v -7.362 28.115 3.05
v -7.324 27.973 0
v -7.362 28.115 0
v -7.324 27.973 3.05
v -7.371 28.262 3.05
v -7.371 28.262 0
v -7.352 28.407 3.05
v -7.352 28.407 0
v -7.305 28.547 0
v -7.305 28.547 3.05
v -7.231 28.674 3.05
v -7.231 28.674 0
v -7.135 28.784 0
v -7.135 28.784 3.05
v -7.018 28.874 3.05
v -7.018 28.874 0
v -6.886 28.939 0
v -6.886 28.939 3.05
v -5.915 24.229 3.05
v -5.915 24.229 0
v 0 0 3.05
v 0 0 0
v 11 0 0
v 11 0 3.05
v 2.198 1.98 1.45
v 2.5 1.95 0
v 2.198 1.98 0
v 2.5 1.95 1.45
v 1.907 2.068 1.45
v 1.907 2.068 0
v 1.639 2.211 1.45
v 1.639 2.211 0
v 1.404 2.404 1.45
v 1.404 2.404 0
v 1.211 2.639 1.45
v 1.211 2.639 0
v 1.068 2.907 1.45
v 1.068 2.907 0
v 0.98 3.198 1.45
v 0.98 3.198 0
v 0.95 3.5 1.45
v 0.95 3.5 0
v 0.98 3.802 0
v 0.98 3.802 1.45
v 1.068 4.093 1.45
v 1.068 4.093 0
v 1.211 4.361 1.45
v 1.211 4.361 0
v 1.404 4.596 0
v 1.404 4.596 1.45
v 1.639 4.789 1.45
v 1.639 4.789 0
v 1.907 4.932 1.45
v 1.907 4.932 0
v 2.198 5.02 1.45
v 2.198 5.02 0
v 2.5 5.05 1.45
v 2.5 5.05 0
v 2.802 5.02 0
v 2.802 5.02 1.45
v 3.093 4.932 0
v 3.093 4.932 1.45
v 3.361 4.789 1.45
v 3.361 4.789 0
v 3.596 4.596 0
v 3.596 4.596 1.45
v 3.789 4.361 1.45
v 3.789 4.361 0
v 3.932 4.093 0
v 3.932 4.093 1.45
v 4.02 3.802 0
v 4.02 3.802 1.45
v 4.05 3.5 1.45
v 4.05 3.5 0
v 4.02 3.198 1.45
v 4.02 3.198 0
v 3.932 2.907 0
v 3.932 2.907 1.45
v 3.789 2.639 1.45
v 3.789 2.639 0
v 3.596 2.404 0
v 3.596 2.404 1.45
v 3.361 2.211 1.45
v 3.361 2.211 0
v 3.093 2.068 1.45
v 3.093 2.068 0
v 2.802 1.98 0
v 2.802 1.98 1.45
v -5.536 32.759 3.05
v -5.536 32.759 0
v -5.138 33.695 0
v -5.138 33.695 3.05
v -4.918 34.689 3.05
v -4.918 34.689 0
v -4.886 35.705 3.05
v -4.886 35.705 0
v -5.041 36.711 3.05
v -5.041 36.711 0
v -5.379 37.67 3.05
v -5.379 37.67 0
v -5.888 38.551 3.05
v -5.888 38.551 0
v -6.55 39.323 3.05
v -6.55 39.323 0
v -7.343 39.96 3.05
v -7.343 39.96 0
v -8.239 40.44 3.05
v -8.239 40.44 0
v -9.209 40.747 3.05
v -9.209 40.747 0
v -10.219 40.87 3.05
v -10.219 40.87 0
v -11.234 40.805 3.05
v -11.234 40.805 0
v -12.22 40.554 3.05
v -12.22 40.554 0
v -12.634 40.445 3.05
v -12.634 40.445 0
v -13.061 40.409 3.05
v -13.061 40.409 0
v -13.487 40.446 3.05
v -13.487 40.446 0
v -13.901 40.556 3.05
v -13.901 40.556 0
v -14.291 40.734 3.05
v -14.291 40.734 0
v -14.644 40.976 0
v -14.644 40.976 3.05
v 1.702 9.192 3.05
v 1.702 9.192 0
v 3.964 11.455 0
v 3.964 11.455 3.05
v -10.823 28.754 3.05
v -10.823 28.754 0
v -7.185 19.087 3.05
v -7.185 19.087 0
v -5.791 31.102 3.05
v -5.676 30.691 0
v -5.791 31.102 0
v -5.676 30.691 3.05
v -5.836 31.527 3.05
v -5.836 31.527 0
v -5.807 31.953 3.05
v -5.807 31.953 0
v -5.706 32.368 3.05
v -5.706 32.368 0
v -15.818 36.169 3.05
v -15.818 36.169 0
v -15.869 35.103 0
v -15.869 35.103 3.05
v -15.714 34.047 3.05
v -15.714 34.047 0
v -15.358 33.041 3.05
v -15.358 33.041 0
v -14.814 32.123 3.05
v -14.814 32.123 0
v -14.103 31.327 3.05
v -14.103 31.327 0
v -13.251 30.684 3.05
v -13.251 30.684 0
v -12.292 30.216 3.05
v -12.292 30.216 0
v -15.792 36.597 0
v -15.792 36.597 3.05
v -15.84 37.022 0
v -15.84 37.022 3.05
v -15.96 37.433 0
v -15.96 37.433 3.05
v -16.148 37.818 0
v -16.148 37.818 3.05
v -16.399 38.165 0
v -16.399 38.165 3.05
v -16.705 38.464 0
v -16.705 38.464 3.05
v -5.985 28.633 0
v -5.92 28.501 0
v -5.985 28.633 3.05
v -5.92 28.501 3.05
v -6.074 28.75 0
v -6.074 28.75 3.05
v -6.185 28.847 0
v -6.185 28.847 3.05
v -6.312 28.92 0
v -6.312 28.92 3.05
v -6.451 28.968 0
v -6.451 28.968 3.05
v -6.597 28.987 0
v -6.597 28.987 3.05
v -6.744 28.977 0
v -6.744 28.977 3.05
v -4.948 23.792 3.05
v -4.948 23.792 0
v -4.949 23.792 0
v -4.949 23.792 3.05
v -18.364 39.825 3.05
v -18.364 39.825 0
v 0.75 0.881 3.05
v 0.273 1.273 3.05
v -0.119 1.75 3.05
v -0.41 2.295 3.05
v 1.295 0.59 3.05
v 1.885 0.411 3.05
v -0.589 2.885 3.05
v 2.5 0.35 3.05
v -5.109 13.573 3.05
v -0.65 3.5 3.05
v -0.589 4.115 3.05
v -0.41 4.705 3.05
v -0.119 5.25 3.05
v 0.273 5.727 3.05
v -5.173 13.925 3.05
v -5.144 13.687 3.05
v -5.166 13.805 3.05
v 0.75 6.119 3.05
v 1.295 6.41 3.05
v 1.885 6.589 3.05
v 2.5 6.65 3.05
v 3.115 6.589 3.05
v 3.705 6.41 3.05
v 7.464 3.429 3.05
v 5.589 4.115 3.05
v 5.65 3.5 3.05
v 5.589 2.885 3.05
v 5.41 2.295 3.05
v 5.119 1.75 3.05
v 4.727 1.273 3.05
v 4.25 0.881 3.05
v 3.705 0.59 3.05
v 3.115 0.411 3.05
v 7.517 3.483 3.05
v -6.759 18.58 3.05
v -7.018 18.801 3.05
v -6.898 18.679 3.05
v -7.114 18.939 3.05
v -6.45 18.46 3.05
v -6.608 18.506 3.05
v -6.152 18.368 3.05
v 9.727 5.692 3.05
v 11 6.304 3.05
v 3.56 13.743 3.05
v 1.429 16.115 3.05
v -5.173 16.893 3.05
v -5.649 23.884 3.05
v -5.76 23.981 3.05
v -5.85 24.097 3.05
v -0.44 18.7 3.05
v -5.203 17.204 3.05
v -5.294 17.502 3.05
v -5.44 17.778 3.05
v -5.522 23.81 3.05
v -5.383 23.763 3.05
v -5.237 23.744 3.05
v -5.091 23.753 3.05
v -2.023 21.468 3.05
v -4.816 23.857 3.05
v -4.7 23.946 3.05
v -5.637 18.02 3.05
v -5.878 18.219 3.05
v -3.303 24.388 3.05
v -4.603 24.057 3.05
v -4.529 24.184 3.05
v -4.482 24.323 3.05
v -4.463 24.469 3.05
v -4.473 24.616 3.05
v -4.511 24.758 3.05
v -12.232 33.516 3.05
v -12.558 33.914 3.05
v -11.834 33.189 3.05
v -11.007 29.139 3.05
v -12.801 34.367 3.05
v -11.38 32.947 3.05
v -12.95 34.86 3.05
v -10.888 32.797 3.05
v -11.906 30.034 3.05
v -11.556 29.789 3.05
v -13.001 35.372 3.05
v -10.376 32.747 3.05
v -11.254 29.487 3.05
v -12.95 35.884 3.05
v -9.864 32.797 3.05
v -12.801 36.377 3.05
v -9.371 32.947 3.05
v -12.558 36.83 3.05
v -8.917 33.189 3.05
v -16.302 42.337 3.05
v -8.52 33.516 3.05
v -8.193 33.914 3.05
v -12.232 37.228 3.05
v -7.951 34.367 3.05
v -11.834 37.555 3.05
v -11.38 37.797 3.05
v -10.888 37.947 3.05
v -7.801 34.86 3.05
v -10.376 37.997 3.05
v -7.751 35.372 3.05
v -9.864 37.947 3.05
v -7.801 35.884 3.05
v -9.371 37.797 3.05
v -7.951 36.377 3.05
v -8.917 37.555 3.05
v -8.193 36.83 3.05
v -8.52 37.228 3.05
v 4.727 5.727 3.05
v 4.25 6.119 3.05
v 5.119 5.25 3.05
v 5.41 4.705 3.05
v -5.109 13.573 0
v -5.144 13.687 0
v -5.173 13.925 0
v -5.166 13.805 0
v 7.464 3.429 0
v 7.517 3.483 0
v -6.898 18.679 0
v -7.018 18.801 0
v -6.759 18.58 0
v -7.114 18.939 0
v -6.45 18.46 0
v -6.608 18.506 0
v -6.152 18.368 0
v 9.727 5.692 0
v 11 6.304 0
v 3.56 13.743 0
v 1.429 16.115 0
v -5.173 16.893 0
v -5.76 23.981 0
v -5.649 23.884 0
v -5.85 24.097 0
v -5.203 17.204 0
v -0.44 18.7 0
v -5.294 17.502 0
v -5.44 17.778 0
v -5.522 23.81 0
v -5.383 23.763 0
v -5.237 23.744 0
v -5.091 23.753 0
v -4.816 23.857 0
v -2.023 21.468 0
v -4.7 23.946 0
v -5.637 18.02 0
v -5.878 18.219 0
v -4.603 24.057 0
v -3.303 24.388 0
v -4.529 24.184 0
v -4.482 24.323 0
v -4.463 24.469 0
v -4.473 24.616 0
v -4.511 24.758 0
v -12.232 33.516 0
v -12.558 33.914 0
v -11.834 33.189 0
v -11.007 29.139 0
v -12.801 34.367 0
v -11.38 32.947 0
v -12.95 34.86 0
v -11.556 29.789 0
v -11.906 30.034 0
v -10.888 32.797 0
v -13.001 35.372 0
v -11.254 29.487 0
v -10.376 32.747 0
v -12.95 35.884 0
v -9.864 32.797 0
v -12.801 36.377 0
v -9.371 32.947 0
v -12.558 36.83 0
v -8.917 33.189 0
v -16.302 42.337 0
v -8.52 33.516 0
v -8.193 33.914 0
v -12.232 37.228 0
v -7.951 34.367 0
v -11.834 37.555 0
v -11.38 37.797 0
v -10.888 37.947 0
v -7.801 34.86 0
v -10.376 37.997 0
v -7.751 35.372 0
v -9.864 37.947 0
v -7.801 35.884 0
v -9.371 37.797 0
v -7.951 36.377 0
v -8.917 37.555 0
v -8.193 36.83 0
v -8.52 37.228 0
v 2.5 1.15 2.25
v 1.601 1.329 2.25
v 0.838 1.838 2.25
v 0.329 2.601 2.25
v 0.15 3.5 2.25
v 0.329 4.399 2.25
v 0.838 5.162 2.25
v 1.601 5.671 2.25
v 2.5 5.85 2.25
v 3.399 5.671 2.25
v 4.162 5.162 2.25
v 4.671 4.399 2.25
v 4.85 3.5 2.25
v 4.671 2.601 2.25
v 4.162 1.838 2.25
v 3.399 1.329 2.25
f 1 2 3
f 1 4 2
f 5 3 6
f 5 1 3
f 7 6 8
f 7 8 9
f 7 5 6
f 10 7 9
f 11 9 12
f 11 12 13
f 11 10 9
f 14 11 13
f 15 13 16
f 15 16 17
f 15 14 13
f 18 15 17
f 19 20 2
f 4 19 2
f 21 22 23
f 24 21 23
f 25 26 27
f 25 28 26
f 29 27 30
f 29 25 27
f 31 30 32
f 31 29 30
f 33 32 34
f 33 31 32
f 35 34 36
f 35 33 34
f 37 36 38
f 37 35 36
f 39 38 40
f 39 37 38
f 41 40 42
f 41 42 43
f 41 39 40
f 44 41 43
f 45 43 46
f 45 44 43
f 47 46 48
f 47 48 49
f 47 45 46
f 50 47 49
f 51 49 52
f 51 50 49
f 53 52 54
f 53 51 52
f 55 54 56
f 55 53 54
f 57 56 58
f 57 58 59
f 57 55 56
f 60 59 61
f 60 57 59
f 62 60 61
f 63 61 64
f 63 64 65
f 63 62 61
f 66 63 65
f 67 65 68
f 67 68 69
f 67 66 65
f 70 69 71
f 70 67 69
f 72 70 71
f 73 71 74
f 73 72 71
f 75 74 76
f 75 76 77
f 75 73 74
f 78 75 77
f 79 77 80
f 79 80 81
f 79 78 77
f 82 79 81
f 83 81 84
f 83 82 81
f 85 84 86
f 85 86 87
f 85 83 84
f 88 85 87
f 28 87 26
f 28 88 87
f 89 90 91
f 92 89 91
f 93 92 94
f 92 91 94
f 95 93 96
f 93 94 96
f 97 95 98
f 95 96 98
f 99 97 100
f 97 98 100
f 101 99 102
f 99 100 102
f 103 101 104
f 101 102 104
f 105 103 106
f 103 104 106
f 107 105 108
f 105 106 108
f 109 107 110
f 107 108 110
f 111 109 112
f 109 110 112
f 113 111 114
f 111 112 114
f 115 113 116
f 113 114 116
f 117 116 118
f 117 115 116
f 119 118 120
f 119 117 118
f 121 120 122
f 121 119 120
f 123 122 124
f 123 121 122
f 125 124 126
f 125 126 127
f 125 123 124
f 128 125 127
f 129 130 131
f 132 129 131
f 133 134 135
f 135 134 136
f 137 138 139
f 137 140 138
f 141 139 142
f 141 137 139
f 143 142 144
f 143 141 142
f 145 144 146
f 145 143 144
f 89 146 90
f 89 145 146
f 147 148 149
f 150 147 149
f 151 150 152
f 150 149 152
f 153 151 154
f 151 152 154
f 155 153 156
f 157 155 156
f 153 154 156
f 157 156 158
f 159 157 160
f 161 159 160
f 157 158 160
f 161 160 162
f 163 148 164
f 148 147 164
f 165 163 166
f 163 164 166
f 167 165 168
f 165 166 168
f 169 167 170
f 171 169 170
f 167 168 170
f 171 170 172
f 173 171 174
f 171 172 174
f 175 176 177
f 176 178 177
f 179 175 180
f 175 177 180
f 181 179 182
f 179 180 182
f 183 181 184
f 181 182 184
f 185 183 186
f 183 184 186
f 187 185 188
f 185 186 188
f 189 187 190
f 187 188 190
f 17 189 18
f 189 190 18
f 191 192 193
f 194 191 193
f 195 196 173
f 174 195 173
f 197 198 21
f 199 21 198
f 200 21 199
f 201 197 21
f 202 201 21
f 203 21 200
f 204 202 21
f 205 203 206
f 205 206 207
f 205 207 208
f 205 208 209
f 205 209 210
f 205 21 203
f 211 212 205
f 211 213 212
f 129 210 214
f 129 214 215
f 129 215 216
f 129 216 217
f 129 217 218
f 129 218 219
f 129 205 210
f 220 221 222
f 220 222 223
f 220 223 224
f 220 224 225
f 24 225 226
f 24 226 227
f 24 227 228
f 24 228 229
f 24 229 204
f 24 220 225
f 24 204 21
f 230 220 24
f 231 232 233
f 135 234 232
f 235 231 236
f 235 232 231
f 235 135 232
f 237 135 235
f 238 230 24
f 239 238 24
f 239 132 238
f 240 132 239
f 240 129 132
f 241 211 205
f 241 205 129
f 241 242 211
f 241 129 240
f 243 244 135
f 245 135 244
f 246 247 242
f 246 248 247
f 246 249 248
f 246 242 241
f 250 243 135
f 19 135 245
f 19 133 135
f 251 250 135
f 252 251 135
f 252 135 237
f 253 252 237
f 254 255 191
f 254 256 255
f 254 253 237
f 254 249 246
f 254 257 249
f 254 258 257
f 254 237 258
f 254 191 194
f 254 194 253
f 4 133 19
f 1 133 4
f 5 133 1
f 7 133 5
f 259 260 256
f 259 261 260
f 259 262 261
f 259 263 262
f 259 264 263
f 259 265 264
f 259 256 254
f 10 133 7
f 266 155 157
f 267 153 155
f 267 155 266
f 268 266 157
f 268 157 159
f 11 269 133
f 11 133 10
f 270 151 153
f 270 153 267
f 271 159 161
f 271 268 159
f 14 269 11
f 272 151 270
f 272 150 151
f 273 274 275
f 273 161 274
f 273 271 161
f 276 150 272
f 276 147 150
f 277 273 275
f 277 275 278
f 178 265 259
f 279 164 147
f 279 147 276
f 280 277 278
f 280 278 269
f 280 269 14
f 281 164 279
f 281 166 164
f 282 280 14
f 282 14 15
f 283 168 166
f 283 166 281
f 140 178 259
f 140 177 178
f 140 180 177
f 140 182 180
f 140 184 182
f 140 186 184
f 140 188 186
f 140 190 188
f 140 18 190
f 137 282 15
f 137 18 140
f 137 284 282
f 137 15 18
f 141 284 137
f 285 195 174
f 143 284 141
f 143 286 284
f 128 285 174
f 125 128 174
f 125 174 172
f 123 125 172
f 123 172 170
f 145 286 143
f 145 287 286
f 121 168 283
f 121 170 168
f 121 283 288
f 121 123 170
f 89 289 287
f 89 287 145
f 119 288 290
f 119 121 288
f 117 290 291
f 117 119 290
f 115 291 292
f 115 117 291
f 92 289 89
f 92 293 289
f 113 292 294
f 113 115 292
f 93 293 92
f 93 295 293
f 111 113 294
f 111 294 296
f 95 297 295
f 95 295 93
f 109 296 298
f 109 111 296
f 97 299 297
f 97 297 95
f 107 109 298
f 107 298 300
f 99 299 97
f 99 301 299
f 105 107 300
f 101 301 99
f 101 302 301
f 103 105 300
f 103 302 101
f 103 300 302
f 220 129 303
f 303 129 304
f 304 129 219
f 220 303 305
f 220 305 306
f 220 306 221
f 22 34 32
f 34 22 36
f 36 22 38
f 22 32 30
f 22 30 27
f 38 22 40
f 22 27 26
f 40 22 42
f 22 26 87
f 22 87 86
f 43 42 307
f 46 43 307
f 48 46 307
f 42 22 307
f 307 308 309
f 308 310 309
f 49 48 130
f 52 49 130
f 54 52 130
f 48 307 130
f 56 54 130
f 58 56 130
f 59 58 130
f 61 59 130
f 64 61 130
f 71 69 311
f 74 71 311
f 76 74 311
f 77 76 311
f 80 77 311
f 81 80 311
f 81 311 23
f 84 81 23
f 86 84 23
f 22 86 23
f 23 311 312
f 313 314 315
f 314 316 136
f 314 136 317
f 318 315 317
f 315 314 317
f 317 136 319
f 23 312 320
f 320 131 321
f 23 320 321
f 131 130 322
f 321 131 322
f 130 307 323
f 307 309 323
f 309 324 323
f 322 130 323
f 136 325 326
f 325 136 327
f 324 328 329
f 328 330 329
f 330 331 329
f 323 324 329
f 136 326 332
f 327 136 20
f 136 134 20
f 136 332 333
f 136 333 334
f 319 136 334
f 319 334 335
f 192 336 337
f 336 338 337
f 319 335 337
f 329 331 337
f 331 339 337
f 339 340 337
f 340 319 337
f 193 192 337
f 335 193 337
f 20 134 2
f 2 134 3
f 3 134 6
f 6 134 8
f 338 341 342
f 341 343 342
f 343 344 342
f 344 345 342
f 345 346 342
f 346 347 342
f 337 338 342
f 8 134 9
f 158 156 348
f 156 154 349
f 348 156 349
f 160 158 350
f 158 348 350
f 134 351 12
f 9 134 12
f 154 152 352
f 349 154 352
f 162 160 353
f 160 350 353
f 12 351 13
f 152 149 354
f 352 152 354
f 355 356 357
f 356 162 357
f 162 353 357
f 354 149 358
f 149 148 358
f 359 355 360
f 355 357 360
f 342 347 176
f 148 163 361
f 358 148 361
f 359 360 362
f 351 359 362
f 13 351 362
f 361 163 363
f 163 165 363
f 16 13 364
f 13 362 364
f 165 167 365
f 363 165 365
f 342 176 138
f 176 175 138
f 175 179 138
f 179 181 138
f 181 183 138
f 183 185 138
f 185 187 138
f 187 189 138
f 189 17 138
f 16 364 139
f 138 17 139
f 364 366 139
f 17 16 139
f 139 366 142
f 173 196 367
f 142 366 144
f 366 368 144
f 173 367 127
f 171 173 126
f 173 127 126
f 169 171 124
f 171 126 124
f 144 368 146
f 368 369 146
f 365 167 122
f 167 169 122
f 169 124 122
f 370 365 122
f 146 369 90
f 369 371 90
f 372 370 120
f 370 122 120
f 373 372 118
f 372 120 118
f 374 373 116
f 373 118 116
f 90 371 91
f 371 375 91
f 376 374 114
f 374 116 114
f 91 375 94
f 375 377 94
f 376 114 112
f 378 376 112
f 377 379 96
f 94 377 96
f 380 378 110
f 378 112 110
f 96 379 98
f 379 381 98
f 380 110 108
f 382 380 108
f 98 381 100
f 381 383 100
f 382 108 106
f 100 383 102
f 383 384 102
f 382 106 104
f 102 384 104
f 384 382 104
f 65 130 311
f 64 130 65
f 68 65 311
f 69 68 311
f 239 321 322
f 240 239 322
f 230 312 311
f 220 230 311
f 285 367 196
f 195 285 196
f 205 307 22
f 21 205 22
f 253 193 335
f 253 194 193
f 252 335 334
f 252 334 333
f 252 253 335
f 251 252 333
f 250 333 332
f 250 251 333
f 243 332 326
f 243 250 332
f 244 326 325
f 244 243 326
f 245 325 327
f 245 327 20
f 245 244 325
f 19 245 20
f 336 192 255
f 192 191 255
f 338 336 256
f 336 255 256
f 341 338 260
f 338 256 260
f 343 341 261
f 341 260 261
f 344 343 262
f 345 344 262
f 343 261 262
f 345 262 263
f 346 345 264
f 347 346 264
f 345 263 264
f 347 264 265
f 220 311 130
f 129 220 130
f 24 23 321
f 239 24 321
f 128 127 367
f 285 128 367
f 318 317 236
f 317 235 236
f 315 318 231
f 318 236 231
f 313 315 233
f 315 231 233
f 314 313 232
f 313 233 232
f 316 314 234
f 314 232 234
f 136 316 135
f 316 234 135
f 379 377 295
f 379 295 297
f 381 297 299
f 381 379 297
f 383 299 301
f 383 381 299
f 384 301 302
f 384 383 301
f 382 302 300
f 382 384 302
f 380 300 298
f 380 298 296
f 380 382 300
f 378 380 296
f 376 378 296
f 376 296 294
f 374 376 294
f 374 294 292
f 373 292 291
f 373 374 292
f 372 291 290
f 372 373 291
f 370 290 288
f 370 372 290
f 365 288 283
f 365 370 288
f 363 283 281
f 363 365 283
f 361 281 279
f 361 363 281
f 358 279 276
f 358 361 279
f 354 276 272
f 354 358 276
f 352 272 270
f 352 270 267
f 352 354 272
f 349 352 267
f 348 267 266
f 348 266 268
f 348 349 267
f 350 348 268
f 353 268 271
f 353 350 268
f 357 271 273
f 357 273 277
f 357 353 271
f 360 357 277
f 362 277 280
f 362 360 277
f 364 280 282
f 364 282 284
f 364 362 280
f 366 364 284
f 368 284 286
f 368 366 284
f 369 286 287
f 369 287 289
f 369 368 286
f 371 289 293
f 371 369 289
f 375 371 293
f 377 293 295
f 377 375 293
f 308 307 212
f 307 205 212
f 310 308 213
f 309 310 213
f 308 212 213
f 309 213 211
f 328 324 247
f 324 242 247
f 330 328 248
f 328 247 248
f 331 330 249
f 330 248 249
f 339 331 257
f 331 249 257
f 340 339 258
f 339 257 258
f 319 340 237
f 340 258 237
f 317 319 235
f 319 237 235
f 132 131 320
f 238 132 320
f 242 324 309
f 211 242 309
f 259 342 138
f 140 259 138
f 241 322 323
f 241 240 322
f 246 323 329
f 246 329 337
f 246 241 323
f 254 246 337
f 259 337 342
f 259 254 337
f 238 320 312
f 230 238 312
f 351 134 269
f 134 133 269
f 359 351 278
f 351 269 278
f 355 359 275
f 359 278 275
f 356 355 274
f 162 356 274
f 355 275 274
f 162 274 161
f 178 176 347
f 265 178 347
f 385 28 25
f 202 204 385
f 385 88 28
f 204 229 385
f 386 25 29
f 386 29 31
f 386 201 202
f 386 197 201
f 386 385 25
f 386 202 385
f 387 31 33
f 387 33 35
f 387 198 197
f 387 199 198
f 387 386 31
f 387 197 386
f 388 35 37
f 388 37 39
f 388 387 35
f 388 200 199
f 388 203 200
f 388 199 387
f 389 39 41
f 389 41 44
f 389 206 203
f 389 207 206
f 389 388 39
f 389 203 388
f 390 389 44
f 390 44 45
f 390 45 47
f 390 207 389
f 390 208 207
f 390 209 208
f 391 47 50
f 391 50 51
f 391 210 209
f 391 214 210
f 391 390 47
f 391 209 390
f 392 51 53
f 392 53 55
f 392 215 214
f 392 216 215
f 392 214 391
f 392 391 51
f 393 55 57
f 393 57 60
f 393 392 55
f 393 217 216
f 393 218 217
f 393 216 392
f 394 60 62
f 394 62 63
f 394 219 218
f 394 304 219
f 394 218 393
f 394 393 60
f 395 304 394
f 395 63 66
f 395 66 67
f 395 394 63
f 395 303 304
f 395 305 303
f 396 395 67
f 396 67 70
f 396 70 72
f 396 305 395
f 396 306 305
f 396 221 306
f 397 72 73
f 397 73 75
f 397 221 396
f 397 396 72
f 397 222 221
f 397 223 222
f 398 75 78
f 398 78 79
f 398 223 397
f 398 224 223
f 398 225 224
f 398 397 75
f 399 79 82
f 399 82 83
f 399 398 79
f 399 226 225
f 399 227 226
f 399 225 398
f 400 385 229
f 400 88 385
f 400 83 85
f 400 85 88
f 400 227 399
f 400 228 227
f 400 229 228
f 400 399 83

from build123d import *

# Parameters (mm, degrees)
SKETCH1_R           = 1.5
SKETCH1_R_2         = 2.625
BOSS_EXTRUDE1_DEPTH = 3.05
FILLET2_R           = 1.6
FILLET3_R           = 2.5
FILLET4_R           = 30
FILLET5_R           = 1
FILLET6_R           = 0.75


with BuildPart() as part:
    # Sketch1 → Boss-Extrude1 (new body)
    with BuildSketch(Plane.XY):
        with BuildLine():
            Line((-5.172936369, 13.742966599), (0, 0))
            Line((0, 0), (11, 0))
            Line((11, 0), (11, 6.303908615))
            Line((11, 6.303908615), (-1.02081528, 18.324723896))
            Line((-1.02081528, 18.324723896), (-6.124201376, 31.882915925))
            ThreePointArc((-6.124201376, 31.882915925), (-6.290762776, 39.054617678), (-13.40685584, 39.961407754))
            Line((-13.40685584, 39.961407754), (-16.302263716, 42.337468617))
            Line((-16.302263716, 42.337468617), (-18.363969834, 39.82512551))
            Line((-18.363969834, 39.82512551), (-15.468561957, 37.449064647))
            ThreePointArc((-15.468561957, 37.449064647), (-15.176038376, 32.687133516), (-11.271628404, 29.945393026))
            Line((-11.271628404, 29.945393026), (-6.960865313, 18.492966599))
            Line((-6.960865313, 18.492966599), (-5.172936369, 18.492966599))
            Line((-5.172936369, 18.492966599), (-5.172936369, 13.742966599))
        make_face()
        with Locations((2.5, 3.5)):
            Circle(SKETCH1_R, mode=Mode.SUBTRACT)
        Polygon((9.727207794, 5.692209589), (7.517499103, 3.482500897), (7.464466094, 3.429467889), (1.701545827, 9.192388155), (3.964287527, 11.455129855), align=None, mode=Mode.SUBTRACT)
        Polygon((-5.650354628, 23.527354521), (-7.587877527, 28.67478155), (-6.184033792, 29.203196886), (-4.246510893, 24.055769857), align=None, mode=Mode.SUBTRACT)
        with Locations((-10.375858941, 35.371957047)):
            Circle(SKETCH1_R_2, mode=Mode.SUBTRACT)
    extrude(amount=BOSS_EXTRUDE1_DEPTH)

    # Sketch3 → CSK for M3 Flat Head Machine Screw1 (revolve, cut)
    with BuildSketch(Plane(origin=(2.5, 3.5, 3.05), x_dir=(0, -1, 0), z_dir=(1, 0, 0))):
        Polygon((0, 0), (0, 3.05), (1.55, 3.05), (1.55, 1.6), (3.15, 0), align=None)
    revolve(axis=Axis((2.5, 3.5, 9.4), (0, 0, -1)), mode=Mode.SUBTRACT)

    # Fillet2
    fillet2_edges = [part.edges().sort_by_distance(p)[0] for p in [
        (-5.172936369, 18.492966599, 1.525),
    ]]
    fillet(fillet2_edges, radius=FILLET2_R)

    # Fillet3
    fillet3_edges = [part.edges().sort_by_distance(p)[0] for p in [
        (-6.124201376, 31.882915925, 1.525),
        (-11.271628404, 29.945393026, 1.525),
        (-15.468561957, 37.449064647, 1.525),
        (-13.40685584, 39.961407754, 1.525),
    ]]
    fillet(fillet3_edges, radius=FILLET3_R)

    # Fillet4
    fillet4_edges = [part.edges().sort_by_distance(p)[0] for p in [
        (-1.02081528, 18.324723896, 1.525),
    ]]
    fillet(fillet4_edges, radius=FILLET4_R)

    # Fillet5
    fillet5_edges = [part.edges().sort_by_distance(p)[0] for p in [
        (-6.960865313, 18.492966599, 1.525),
        (-5.172936369, 13.742966599, 1.525),
    ]]
    fillet(fillet5_edges, radius=FILLET5_R)

    # Fillet6
    fillet6_edges = [part.edges().sort_by_distance(p)[0] for p in [
        (-4.246510893, 24.055769857, 1.525),
        (-5.650354628, 23.527354521, 1.525),
        (-6.184033792, 29.203196886, 1.525),
        (-7.587877527, 28.67478155, 1.525),
    ]]
    fillet(fillet6_edges, radius=FILLET6_R - 0.0001)  # a hair under: the kernel refuses the full size


solid = part.part
